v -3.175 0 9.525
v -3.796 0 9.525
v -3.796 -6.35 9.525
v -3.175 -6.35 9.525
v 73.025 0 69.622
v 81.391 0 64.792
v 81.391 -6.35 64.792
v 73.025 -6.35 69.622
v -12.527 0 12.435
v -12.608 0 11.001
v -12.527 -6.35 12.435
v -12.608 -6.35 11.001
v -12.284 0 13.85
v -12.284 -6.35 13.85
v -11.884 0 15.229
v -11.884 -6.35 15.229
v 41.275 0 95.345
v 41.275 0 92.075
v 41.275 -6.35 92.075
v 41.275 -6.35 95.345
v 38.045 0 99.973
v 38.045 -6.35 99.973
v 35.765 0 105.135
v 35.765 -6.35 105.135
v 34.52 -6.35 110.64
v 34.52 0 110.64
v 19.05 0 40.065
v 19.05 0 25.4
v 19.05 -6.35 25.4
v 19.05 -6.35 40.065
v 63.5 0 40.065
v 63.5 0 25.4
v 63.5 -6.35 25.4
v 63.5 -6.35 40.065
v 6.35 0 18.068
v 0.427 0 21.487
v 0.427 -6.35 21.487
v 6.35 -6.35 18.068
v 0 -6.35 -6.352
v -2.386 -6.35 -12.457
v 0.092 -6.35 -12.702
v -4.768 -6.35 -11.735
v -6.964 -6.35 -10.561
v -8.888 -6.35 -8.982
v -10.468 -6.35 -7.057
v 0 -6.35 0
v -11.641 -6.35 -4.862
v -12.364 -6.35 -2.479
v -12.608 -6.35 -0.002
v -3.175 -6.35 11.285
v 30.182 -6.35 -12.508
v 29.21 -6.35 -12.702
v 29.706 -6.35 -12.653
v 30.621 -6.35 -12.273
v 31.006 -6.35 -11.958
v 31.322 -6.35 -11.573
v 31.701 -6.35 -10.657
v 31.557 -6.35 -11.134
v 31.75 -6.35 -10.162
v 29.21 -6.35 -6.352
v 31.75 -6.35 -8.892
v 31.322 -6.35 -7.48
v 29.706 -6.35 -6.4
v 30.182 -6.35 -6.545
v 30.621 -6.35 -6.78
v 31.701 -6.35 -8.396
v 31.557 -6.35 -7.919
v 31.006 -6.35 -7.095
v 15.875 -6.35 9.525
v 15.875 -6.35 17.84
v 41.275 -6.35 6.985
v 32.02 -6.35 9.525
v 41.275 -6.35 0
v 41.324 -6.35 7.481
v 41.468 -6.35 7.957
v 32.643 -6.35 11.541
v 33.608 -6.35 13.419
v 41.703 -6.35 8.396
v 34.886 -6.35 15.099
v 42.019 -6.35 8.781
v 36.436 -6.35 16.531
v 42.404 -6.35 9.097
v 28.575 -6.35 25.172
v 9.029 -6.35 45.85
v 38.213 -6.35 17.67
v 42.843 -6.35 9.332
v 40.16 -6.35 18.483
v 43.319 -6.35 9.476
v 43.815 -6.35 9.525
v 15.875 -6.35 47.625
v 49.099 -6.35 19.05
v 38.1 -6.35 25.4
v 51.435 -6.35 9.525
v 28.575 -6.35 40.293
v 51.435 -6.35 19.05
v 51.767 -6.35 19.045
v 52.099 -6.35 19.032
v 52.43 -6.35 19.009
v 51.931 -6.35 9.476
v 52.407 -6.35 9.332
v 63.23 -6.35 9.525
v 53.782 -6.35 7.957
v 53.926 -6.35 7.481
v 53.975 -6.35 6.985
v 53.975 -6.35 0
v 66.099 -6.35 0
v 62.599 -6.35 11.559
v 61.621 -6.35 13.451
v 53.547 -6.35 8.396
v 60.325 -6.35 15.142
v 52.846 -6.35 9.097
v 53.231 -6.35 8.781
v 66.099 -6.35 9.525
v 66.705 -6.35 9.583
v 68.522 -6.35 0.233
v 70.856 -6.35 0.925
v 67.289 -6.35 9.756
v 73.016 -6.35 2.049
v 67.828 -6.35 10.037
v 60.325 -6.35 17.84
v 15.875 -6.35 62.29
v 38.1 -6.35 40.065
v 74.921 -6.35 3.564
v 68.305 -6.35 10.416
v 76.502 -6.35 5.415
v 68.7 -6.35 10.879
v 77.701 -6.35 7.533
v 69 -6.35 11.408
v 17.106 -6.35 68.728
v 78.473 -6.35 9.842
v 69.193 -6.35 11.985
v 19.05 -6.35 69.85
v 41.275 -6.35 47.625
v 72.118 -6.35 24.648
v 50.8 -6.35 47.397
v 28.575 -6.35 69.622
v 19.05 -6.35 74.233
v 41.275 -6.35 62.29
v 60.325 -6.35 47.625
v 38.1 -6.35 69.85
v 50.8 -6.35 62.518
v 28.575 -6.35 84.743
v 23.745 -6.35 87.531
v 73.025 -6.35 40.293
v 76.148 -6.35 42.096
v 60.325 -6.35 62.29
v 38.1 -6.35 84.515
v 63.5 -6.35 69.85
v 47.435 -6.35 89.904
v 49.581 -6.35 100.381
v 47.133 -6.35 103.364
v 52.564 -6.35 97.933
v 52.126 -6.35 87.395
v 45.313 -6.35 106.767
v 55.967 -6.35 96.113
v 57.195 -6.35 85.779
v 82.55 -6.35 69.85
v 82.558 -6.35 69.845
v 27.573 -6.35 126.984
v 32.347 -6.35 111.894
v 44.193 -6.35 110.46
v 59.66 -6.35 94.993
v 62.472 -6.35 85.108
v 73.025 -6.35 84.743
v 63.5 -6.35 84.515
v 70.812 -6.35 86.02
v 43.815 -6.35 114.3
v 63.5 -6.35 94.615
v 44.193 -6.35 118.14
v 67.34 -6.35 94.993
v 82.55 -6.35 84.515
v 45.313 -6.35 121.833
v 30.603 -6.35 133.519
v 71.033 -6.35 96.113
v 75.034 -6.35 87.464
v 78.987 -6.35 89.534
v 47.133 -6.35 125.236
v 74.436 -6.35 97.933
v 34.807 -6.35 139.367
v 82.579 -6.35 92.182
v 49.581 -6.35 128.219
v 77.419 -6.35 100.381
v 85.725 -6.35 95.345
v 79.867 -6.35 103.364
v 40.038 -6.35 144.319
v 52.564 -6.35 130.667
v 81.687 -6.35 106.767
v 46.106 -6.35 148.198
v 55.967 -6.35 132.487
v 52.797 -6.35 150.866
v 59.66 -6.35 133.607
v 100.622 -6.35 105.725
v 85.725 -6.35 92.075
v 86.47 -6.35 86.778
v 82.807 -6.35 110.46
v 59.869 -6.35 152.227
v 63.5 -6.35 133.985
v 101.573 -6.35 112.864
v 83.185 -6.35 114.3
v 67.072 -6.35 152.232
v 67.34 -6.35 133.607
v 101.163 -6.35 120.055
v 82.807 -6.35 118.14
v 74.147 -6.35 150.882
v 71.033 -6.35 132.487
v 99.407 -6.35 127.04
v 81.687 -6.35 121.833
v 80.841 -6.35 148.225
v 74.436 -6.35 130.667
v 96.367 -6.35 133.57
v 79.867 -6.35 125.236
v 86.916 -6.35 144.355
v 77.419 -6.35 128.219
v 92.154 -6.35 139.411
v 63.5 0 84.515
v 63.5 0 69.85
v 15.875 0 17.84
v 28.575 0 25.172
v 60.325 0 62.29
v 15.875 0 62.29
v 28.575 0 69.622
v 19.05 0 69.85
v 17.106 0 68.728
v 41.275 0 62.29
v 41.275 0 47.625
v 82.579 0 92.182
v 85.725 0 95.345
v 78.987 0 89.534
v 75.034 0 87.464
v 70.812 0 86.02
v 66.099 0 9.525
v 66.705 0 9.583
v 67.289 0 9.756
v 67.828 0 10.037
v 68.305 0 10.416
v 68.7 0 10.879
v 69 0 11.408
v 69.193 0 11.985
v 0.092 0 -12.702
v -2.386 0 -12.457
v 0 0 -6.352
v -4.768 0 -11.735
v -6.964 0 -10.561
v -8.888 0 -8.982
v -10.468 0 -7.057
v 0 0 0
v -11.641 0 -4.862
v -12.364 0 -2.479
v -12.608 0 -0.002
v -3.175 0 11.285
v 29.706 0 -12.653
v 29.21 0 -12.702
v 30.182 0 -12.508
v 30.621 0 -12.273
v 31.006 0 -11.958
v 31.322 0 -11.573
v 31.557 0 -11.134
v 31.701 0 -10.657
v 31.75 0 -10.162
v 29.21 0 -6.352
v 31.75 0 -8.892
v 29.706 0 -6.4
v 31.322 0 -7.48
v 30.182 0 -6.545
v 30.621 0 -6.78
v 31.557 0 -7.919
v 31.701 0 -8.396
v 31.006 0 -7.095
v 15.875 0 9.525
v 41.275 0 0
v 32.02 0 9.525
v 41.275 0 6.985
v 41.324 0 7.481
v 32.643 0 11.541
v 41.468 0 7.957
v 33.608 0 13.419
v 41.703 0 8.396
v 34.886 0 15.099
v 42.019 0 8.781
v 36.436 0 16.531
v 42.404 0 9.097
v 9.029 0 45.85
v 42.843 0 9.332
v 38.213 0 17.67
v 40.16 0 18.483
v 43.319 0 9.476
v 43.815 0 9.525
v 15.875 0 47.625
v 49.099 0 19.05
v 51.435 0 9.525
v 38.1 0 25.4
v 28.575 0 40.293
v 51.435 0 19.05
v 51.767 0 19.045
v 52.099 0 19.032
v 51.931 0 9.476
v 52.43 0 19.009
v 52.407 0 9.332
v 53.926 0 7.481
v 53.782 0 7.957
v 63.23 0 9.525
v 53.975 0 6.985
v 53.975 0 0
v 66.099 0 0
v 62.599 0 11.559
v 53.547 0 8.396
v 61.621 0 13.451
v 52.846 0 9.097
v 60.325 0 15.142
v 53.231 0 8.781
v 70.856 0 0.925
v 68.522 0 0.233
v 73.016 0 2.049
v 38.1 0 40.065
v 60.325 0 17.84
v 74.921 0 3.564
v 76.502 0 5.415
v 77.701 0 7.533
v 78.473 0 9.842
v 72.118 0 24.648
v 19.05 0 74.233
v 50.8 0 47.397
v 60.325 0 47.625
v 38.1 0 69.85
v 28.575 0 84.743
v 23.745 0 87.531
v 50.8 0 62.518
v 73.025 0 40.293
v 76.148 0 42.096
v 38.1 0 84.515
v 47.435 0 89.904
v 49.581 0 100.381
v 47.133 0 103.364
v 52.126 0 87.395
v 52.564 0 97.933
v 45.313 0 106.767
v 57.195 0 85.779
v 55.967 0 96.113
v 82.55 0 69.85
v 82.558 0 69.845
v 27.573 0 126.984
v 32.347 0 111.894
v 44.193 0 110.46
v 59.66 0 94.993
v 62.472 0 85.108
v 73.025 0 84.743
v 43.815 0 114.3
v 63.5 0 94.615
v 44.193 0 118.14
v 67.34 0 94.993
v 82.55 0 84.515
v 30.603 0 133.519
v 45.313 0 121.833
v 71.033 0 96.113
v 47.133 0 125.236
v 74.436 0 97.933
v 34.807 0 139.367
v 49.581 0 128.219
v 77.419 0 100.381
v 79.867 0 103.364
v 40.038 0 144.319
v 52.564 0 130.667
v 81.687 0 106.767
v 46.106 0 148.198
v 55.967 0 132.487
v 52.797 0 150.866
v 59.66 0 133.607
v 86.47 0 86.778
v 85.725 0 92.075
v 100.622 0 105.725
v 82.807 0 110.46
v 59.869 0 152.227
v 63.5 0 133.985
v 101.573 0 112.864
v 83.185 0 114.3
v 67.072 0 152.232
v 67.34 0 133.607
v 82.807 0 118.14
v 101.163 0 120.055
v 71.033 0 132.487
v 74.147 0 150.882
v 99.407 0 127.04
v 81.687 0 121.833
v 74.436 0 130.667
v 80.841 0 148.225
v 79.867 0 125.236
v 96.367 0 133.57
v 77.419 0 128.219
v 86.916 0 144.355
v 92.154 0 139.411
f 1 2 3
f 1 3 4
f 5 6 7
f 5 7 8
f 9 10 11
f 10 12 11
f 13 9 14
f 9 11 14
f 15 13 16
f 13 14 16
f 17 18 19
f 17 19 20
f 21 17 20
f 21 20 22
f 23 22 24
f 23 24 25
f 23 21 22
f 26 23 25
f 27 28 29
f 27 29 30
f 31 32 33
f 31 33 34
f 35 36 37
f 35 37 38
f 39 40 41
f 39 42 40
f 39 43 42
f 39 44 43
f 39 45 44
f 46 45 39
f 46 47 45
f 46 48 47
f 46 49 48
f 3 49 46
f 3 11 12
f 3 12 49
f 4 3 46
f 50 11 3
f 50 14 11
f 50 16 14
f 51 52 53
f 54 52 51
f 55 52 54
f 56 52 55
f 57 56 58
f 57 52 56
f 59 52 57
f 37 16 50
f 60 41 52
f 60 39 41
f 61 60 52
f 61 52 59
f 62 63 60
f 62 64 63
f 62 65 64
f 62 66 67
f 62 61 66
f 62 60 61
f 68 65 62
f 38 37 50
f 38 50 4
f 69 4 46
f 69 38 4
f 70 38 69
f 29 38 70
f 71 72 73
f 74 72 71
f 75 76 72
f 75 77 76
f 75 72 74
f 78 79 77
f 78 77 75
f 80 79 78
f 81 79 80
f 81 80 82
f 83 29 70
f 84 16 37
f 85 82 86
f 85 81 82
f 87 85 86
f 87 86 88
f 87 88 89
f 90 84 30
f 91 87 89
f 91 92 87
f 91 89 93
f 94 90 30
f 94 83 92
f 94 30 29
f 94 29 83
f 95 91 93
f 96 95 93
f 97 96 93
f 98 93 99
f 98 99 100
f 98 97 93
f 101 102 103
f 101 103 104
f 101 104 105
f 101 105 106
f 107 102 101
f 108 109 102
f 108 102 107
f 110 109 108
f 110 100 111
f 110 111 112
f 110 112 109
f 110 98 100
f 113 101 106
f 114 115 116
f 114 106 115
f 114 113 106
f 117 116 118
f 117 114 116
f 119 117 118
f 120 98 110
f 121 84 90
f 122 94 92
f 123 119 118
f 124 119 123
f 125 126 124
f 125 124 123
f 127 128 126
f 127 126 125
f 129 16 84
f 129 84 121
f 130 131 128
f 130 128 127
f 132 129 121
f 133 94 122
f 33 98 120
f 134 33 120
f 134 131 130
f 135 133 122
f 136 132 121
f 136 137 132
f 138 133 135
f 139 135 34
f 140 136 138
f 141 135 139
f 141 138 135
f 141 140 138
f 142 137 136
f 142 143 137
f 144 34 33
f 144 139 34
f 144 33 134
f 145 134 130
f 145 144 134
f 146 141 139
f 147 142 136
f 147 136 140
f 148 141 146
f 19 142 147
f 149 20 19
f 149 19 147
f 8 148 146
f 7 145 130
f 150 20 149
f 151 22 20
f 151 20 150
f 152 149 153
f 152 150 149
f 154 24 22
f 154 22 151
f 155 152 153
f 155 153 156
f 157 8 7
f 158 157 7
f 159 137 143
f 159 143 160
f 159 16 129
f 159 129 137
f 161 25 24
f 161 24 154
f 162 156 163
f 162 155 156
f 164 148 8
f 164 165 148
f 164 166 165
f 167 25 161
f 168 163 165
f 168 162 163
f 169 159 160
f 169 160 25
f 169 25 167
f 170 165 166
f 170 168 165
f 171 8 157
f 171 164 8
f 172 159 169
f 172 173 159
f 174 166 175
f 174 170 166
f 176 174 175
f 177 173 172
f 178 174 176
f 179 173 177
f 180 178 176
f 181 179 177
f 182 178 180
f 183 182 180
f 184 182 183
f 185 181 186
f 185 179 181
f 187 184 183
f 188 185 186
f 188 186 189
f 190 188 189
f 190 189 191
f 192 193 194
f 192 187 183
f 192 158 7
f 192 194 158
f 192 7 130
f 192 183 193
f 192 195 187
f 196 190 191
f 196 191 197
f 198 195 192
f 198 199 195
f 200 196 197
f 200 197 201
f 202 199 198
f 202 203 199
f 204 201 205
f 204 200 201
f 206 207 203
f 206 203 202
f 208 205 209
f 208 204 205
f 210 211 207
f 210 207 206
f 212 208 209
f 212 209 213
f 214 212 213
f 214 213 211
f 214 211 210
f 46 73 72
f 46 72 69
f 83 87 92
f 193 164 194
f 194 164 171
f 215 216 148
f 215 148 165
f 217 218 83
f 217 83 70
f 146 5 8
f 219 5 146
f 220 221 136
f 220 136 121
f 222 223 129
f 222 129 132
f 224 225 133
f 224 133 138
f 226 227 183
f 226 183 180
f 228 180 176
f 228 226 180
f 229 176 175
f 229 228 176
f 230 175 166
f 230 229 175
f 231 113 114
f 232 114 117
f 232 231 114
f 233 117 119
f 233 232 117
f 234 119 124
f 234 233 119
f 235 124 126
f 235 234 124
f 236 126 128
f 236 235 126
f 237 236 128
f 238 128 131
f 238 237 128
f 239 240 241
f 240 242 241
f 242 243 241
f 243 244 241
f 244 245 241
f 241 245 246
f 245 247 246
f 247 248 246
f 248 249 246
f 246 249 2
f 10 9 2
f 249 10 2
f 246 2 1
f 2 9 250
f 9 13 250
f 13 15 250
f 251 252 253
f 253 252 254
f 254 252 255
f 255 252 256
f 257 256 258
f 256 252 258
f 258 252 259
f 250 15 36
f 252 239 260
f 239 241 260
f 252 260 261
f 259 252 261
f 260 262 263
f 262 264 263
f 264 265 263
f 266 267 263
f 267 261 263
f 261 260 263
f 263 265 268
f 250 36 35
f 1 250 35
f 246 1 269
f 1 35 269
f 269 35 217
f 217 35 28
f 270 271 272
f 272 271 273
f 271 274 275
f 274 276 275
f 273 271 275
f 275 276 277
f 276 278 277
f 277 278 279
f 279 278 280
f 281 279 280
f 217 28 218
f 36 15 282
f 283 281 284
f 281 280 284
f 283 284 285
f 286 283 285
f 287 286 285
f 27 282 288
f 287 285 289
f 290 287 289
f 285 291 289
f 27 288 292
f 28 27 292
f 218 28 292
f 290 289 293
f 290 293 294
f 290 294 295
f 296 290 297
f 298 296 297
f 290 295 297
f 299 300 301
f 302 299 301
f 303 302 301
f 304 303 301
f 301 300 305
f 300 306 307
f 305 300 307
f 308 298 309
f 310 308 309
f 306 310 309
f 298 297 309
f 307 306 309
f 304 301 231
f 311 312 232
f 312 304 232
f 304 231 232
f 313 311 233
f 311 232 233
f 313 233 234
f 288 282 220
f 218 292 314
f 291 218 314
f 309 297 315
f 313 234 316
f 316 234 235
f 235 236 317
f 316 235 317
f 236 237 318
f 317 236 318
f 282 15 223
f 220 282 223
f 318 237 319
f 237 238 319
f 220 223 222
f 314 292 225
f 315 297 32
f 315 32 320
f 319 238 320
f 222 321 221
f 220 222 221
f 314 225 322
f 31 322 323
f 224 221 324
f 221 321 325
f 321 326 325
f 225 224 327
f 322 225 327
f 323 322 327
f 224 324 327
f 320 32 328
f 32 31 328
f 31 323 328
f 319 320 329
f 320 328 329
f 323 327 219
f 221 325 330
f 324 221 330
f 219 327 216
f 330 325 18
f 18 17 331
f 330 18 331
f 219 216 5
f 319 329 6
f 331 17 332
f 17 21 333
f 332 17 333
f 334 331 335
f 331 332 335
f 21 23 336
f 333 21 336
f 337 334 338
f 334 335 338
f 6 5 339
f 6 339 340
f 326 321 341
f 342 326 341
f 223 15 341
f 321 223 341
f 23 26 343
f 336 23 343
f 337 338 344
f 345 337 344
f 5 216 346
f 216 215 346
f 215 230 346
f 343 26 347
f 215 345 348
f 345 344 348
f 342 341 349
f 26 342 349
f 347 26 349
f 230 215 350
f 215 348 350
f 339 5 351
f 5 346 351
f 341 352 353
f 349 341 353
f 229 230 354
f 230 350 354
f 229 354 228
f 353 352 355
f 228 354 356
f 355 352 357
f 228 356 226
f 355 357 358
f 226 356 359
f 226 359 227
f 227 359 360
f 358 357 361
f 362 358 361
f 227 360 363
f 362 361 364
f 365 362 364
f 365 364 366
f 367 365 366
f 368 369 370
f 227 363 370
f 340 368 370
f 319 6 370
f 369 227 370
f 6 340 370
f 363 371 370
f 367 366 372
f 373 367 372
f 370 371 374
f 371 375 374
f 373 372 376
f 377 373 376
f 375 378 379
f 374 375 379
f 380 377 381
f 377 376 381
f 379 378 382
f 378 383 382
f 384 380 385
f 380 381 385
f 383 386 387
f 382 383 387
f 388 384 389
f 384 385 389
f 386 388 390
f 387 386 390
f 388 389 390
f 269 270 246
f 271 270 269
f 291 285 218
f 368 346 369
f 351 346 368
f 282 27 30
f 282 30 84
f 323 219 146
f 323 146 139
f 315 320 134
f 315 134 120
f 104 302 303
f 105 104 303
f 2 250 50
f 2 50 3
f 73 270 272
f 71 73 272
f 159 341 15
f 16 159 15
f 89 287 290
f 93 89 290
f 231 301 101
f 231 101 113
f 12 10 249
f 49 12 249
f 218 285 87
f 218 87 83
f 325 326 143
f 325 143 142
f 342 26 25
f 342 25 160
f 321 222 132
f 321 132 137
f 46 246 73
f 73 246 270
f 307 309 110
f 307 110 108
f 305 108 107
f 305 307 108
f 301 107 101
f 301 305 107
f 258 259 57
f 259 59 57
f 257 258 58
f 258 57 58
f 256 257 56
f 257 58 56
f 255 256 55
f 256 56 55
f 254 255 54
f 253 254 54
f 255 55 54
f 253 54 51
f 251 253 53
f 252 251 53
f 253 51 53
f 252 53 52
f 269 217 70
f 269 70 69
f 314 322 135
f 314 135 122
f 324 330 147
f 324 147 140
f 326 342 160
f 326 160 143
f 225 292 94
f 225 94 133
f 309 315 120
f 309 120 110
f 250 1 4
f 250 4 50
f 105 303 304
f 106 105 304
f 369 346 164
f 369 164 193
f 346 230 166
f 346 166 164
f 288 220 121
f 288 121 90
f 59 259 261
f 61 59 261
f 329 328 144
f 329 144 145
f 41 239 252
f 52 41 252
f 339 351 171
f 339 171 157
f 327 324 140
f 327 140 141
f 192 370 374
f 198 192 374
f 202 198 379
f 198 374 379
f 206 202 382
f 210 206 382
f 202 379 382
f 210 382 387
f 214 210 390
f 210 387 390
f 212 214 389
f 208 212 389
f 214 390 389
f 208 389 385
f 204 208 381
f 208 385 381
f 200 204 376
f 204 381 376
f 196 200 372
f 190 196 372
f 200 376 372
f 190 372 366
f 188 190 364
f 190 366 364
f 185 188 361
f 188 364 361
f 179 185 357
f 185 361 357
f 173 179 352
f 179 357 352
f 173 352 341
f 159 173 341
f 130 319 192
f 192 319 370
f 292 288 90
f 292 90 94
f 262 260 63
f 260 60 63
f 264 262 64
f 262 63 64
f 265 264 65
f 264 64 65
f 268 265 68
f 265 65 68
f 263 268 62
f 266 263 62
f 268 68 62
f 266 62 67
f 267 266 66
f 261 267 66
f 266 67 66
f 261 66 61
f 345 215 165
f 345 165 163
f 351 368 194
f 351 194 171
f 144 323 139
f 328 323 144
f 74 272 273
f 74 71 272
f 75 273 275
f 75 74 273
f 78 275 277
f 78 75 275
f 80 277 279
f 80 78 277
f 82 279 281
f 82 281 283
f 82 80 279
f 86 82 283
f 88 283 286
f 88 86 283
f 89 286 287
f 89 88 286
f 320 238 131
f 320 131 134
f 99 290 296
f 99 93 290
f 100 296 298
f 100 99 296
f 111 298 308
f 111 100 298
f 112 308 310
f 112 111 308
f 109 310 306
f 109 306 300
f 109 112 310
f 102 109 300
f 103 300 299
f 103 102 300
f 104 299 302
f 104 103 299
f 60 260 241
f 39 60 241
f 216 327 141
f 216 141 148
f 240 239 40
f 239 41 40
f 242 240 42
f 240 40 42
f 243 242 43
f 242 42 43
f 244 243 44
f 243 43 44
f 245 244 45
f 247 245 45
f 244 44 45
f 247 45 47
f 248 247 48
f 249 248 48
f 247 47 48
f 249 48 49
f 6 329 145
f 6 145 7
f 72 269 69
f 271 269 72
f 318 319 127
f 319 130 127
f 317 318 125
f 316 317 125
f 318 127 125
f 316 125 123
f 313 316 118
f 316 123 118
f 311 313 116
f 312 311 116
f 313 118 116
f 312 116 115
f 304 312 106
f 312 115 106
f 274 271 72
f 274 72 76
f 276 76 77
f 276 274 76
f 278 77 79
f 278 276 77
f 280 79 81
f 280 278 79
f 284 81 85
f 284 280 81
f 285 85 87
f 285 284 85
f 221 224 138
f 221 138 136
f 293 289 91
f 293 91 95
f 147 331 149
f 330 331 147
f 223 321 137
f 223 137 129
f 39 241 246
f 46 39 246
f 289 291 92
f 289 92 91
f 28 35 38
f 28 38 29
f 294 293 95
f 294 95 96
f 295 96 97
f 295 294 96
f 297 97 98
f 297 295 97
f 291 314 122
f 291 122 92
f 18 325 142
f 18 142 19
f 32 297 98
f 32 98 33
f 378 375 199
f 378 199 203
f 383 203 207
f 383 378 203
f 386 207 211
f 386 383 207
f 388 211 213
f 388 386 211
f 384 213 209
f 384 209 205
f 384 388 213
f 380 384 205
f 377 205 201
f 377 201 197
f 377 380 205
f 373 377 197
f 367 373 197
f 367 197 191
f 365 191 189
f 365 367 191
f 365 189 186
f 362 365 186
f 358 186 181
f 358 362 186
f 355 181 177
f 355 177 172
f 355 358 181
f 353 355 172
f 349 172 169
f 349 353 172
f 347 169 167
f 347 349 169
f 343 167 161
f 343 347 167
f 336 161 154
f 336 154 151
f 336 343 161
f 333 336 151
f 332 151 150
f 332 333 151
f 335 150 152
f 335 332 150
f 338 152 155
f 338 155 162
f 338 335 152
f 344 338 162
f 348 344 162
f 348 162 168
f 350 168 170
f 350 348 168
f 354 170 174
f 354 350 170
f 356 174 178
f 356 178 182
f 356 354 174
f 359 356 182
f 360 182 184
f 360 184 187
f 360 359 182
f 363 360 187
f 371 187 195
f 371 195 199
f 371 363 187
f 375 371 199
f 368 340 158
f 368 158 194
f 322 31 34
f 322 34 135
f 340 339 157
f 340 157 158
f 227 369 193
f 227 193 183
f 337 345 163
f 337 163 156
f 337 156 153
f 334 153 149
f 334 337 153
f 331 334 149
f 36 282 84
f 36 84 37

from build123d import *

# Parameters (mm, degrees)
F0_R     = 19.685
F1_DEPTH = 6.35
F2_R     = 2.54
F3_R     = 12.7
F5_DEPTH = 6.351


with BuildPart() as f1:
    # F0 (on Front) → F1 (new body)
    with BuildSketch(Plane.XZ):
        with BuildLine():
            Line((0, -6.351505), (0, 0))
            Line((0, 0), (41.275, 0))
            Line((41.275, 0), (41.275, 9.525))
            Line((41.275, 9.525), (53.975, 9.525))
            Line((53.975, 9.525), (53.975, 0))
            Line((53.975, 0), (76.2, 0))
            Line((76.2, 0), (100.622425, 105.724714))
            ThreePointArc((100.622425, 105.724714), (74.146687, 150.88221), (27.573491, 126.984477))
            Line((27.573491, 126.984477), (-12.608211, 13.177002))
            Line((-12.608211, 13.177002), (-12.608211, -12.701505))
            Line((-12.608211, -12.701505), (31.75, -12.701505))
            Line((31.75, -12.701505), (31.75, -6.351505))
            Line((31.75, -6.351505), (0, -6.351505))
        make_face()
        with Locations((63.5, 114.3)):
            Circle(F0_R, mode=Mode.SUBTRACT)
    extrude(amount=F1_DEPTH)

    # F2
    f2_edges = [f1.edges().sort_by_distance(p)[0] for p in [
        (31.75, -3.175, -6.351505),
        (31.75, -3.175, -12.701505),
        (41.275, -3.175, 9.525),
        (53.975, -3.175, 9.525),
    ]]
    fillet(f2_edges, radius=F2_R)

    # F3
    f3_edges = [f1.edges().sort_by_distance(p)[0] for p in [
        (-12.608211, -3.175, -12.701505),
        (-12.608211, -3.175, 13.177002),
        (76.2, -3.175, 0),
    ]]
    fillet(f3_edges, radius=F3_R)

    # F4 (on Front) → F5 (cut, through all)
    with BuildSketch(Plane.XZ):
        with BuildLine():
            ThreePointArc((41.275, 95.345489), (36.780001, 102.498908), (34.520263, 110.639546))
            Line((34.520263, 110.639546), (32.346901, 111.894337))
            Line((32.346901, 111.894337), (23.745077, 87.531209))
            Line((23.745077, 87.531209), (28.575, 84.742652))
            Line((28.575, 84.742652), (41.275, 92.075))
            Line((41.275, 92.075), (41.275, 95.345489))
        make_face()
        Polygon((-3.175, 11.284914), (-3.796368, 9.525), (-3.175, 9.525), align=None)
        with BuildLine():
            Line((63.229602, 9.525), (66.099263, 9.525))
            ThreePointArc((66.099263, 9.525), (68.075591, 10.215095), (69.192798, 11.985393))
            Line((69.192798, 11.985393), (72.117945, 24.648357))
            Line((72.117945, 24.648357), (60.325, 17.839697))
            Line((60.325, 17.839697), (60.325, 15.141723))
            ThreePointArc((60.325, 15.141723), (62.151813, 12.527035), (63.229602, 9.525))
        make_face()
        with BuildLine():
            Line((49.098523, 19.05), (51.435, 19.05))
            ThreePointArc((51.435, 19.05), (51.933052, 19.039716), (52.430256, 19.00888))
            Line((52.430256, 19.00888), (63.5, 25.4))
            Line((63.5, 25.4), (63.5, 40.064697))
            Line((63.5, 40.064697), (50.8, 47.397045))
            Line((50.8, 47.397045), (38.1, 40.064697))
            Line((38.1, 40.064697), (38.1, 25.4))
            Line((38.1, 25.4), (49.098523, 19.05))
        make_face()
        with BuildLine():
            Line((15.875, 9.525), (32.020398, 9.525))
            ThreePointArc((32.020398, 9.525), (34.885752, 15.098738), (40.160436, 18.483191))
            Line((40.160436, 18.483191), (28.575, 25.172045))
            Line((28.575, 25.172045), (15.875, 17.839697))
            Line((15.875, 17.839697), (15.875, 9.525))
        make_face()
        Polygon((19.05, 40.064697), (9.028931, 45.850364), (0.427107, 21.487236), (6.35, 18.067652), (19.05, 25.4), align=None)
        Polygon((19.05, 69.85), (19.05, 74.233246), (17.106185, 68.727738), align=None)
        with BuildLine():
            Line((63.5, 84.514697), (62.472217, 85.108087))
            ThreePointArc((62.472217, 85.108087), (54.623617, 86.471347), (47.435202, 89.904378))
            Line((47.435202, 89.904378), (38.1, 84.514697))
            Line((38.1, 84.514697), (38.1, 69.85))
            Line((38.1, 69.85), (50.8, 62.517652))
            Line((50.8, 62.517652), (63.5, 69.85))
            Line((63.5, 69.85), (63.5, 84.514697))
        make_face()
        Polygon((86.469863, 86.777831), (82.55, 84.514697), (82.55, 69.85), (82.55841, 69.845145), align=None)
        Polygon((15.875, 62.289697), (15.875, 47.625), (28.575, 40.292652), (41.275, 47.625), (41.275, 62.289697), (28.575, 69.622045), align=None)
        Polygon((60.325, 62.289697), (60.325, 47.625), (73.025, 40.292652), (76.148332, 42.095908), (81.391103, 64.791873), (73.025, 69.622045), align=None)
        with BuildLine():
            Line((70.8124, 86.020097), (73.025, 84.742652))
            Line((73.025, 84.742652), (85.725, 92.075))
            Line((85.725, 92.075), (85.725, 95.345489))
            ThreePointArc((85.725, 95.345489), (78.98726, 89.533715), (70.8124, 86.020097))
        make_face()
    extrude(amount=F5_DEPTH, mode=Mode.SUBTRACT)


solid = f1.part
